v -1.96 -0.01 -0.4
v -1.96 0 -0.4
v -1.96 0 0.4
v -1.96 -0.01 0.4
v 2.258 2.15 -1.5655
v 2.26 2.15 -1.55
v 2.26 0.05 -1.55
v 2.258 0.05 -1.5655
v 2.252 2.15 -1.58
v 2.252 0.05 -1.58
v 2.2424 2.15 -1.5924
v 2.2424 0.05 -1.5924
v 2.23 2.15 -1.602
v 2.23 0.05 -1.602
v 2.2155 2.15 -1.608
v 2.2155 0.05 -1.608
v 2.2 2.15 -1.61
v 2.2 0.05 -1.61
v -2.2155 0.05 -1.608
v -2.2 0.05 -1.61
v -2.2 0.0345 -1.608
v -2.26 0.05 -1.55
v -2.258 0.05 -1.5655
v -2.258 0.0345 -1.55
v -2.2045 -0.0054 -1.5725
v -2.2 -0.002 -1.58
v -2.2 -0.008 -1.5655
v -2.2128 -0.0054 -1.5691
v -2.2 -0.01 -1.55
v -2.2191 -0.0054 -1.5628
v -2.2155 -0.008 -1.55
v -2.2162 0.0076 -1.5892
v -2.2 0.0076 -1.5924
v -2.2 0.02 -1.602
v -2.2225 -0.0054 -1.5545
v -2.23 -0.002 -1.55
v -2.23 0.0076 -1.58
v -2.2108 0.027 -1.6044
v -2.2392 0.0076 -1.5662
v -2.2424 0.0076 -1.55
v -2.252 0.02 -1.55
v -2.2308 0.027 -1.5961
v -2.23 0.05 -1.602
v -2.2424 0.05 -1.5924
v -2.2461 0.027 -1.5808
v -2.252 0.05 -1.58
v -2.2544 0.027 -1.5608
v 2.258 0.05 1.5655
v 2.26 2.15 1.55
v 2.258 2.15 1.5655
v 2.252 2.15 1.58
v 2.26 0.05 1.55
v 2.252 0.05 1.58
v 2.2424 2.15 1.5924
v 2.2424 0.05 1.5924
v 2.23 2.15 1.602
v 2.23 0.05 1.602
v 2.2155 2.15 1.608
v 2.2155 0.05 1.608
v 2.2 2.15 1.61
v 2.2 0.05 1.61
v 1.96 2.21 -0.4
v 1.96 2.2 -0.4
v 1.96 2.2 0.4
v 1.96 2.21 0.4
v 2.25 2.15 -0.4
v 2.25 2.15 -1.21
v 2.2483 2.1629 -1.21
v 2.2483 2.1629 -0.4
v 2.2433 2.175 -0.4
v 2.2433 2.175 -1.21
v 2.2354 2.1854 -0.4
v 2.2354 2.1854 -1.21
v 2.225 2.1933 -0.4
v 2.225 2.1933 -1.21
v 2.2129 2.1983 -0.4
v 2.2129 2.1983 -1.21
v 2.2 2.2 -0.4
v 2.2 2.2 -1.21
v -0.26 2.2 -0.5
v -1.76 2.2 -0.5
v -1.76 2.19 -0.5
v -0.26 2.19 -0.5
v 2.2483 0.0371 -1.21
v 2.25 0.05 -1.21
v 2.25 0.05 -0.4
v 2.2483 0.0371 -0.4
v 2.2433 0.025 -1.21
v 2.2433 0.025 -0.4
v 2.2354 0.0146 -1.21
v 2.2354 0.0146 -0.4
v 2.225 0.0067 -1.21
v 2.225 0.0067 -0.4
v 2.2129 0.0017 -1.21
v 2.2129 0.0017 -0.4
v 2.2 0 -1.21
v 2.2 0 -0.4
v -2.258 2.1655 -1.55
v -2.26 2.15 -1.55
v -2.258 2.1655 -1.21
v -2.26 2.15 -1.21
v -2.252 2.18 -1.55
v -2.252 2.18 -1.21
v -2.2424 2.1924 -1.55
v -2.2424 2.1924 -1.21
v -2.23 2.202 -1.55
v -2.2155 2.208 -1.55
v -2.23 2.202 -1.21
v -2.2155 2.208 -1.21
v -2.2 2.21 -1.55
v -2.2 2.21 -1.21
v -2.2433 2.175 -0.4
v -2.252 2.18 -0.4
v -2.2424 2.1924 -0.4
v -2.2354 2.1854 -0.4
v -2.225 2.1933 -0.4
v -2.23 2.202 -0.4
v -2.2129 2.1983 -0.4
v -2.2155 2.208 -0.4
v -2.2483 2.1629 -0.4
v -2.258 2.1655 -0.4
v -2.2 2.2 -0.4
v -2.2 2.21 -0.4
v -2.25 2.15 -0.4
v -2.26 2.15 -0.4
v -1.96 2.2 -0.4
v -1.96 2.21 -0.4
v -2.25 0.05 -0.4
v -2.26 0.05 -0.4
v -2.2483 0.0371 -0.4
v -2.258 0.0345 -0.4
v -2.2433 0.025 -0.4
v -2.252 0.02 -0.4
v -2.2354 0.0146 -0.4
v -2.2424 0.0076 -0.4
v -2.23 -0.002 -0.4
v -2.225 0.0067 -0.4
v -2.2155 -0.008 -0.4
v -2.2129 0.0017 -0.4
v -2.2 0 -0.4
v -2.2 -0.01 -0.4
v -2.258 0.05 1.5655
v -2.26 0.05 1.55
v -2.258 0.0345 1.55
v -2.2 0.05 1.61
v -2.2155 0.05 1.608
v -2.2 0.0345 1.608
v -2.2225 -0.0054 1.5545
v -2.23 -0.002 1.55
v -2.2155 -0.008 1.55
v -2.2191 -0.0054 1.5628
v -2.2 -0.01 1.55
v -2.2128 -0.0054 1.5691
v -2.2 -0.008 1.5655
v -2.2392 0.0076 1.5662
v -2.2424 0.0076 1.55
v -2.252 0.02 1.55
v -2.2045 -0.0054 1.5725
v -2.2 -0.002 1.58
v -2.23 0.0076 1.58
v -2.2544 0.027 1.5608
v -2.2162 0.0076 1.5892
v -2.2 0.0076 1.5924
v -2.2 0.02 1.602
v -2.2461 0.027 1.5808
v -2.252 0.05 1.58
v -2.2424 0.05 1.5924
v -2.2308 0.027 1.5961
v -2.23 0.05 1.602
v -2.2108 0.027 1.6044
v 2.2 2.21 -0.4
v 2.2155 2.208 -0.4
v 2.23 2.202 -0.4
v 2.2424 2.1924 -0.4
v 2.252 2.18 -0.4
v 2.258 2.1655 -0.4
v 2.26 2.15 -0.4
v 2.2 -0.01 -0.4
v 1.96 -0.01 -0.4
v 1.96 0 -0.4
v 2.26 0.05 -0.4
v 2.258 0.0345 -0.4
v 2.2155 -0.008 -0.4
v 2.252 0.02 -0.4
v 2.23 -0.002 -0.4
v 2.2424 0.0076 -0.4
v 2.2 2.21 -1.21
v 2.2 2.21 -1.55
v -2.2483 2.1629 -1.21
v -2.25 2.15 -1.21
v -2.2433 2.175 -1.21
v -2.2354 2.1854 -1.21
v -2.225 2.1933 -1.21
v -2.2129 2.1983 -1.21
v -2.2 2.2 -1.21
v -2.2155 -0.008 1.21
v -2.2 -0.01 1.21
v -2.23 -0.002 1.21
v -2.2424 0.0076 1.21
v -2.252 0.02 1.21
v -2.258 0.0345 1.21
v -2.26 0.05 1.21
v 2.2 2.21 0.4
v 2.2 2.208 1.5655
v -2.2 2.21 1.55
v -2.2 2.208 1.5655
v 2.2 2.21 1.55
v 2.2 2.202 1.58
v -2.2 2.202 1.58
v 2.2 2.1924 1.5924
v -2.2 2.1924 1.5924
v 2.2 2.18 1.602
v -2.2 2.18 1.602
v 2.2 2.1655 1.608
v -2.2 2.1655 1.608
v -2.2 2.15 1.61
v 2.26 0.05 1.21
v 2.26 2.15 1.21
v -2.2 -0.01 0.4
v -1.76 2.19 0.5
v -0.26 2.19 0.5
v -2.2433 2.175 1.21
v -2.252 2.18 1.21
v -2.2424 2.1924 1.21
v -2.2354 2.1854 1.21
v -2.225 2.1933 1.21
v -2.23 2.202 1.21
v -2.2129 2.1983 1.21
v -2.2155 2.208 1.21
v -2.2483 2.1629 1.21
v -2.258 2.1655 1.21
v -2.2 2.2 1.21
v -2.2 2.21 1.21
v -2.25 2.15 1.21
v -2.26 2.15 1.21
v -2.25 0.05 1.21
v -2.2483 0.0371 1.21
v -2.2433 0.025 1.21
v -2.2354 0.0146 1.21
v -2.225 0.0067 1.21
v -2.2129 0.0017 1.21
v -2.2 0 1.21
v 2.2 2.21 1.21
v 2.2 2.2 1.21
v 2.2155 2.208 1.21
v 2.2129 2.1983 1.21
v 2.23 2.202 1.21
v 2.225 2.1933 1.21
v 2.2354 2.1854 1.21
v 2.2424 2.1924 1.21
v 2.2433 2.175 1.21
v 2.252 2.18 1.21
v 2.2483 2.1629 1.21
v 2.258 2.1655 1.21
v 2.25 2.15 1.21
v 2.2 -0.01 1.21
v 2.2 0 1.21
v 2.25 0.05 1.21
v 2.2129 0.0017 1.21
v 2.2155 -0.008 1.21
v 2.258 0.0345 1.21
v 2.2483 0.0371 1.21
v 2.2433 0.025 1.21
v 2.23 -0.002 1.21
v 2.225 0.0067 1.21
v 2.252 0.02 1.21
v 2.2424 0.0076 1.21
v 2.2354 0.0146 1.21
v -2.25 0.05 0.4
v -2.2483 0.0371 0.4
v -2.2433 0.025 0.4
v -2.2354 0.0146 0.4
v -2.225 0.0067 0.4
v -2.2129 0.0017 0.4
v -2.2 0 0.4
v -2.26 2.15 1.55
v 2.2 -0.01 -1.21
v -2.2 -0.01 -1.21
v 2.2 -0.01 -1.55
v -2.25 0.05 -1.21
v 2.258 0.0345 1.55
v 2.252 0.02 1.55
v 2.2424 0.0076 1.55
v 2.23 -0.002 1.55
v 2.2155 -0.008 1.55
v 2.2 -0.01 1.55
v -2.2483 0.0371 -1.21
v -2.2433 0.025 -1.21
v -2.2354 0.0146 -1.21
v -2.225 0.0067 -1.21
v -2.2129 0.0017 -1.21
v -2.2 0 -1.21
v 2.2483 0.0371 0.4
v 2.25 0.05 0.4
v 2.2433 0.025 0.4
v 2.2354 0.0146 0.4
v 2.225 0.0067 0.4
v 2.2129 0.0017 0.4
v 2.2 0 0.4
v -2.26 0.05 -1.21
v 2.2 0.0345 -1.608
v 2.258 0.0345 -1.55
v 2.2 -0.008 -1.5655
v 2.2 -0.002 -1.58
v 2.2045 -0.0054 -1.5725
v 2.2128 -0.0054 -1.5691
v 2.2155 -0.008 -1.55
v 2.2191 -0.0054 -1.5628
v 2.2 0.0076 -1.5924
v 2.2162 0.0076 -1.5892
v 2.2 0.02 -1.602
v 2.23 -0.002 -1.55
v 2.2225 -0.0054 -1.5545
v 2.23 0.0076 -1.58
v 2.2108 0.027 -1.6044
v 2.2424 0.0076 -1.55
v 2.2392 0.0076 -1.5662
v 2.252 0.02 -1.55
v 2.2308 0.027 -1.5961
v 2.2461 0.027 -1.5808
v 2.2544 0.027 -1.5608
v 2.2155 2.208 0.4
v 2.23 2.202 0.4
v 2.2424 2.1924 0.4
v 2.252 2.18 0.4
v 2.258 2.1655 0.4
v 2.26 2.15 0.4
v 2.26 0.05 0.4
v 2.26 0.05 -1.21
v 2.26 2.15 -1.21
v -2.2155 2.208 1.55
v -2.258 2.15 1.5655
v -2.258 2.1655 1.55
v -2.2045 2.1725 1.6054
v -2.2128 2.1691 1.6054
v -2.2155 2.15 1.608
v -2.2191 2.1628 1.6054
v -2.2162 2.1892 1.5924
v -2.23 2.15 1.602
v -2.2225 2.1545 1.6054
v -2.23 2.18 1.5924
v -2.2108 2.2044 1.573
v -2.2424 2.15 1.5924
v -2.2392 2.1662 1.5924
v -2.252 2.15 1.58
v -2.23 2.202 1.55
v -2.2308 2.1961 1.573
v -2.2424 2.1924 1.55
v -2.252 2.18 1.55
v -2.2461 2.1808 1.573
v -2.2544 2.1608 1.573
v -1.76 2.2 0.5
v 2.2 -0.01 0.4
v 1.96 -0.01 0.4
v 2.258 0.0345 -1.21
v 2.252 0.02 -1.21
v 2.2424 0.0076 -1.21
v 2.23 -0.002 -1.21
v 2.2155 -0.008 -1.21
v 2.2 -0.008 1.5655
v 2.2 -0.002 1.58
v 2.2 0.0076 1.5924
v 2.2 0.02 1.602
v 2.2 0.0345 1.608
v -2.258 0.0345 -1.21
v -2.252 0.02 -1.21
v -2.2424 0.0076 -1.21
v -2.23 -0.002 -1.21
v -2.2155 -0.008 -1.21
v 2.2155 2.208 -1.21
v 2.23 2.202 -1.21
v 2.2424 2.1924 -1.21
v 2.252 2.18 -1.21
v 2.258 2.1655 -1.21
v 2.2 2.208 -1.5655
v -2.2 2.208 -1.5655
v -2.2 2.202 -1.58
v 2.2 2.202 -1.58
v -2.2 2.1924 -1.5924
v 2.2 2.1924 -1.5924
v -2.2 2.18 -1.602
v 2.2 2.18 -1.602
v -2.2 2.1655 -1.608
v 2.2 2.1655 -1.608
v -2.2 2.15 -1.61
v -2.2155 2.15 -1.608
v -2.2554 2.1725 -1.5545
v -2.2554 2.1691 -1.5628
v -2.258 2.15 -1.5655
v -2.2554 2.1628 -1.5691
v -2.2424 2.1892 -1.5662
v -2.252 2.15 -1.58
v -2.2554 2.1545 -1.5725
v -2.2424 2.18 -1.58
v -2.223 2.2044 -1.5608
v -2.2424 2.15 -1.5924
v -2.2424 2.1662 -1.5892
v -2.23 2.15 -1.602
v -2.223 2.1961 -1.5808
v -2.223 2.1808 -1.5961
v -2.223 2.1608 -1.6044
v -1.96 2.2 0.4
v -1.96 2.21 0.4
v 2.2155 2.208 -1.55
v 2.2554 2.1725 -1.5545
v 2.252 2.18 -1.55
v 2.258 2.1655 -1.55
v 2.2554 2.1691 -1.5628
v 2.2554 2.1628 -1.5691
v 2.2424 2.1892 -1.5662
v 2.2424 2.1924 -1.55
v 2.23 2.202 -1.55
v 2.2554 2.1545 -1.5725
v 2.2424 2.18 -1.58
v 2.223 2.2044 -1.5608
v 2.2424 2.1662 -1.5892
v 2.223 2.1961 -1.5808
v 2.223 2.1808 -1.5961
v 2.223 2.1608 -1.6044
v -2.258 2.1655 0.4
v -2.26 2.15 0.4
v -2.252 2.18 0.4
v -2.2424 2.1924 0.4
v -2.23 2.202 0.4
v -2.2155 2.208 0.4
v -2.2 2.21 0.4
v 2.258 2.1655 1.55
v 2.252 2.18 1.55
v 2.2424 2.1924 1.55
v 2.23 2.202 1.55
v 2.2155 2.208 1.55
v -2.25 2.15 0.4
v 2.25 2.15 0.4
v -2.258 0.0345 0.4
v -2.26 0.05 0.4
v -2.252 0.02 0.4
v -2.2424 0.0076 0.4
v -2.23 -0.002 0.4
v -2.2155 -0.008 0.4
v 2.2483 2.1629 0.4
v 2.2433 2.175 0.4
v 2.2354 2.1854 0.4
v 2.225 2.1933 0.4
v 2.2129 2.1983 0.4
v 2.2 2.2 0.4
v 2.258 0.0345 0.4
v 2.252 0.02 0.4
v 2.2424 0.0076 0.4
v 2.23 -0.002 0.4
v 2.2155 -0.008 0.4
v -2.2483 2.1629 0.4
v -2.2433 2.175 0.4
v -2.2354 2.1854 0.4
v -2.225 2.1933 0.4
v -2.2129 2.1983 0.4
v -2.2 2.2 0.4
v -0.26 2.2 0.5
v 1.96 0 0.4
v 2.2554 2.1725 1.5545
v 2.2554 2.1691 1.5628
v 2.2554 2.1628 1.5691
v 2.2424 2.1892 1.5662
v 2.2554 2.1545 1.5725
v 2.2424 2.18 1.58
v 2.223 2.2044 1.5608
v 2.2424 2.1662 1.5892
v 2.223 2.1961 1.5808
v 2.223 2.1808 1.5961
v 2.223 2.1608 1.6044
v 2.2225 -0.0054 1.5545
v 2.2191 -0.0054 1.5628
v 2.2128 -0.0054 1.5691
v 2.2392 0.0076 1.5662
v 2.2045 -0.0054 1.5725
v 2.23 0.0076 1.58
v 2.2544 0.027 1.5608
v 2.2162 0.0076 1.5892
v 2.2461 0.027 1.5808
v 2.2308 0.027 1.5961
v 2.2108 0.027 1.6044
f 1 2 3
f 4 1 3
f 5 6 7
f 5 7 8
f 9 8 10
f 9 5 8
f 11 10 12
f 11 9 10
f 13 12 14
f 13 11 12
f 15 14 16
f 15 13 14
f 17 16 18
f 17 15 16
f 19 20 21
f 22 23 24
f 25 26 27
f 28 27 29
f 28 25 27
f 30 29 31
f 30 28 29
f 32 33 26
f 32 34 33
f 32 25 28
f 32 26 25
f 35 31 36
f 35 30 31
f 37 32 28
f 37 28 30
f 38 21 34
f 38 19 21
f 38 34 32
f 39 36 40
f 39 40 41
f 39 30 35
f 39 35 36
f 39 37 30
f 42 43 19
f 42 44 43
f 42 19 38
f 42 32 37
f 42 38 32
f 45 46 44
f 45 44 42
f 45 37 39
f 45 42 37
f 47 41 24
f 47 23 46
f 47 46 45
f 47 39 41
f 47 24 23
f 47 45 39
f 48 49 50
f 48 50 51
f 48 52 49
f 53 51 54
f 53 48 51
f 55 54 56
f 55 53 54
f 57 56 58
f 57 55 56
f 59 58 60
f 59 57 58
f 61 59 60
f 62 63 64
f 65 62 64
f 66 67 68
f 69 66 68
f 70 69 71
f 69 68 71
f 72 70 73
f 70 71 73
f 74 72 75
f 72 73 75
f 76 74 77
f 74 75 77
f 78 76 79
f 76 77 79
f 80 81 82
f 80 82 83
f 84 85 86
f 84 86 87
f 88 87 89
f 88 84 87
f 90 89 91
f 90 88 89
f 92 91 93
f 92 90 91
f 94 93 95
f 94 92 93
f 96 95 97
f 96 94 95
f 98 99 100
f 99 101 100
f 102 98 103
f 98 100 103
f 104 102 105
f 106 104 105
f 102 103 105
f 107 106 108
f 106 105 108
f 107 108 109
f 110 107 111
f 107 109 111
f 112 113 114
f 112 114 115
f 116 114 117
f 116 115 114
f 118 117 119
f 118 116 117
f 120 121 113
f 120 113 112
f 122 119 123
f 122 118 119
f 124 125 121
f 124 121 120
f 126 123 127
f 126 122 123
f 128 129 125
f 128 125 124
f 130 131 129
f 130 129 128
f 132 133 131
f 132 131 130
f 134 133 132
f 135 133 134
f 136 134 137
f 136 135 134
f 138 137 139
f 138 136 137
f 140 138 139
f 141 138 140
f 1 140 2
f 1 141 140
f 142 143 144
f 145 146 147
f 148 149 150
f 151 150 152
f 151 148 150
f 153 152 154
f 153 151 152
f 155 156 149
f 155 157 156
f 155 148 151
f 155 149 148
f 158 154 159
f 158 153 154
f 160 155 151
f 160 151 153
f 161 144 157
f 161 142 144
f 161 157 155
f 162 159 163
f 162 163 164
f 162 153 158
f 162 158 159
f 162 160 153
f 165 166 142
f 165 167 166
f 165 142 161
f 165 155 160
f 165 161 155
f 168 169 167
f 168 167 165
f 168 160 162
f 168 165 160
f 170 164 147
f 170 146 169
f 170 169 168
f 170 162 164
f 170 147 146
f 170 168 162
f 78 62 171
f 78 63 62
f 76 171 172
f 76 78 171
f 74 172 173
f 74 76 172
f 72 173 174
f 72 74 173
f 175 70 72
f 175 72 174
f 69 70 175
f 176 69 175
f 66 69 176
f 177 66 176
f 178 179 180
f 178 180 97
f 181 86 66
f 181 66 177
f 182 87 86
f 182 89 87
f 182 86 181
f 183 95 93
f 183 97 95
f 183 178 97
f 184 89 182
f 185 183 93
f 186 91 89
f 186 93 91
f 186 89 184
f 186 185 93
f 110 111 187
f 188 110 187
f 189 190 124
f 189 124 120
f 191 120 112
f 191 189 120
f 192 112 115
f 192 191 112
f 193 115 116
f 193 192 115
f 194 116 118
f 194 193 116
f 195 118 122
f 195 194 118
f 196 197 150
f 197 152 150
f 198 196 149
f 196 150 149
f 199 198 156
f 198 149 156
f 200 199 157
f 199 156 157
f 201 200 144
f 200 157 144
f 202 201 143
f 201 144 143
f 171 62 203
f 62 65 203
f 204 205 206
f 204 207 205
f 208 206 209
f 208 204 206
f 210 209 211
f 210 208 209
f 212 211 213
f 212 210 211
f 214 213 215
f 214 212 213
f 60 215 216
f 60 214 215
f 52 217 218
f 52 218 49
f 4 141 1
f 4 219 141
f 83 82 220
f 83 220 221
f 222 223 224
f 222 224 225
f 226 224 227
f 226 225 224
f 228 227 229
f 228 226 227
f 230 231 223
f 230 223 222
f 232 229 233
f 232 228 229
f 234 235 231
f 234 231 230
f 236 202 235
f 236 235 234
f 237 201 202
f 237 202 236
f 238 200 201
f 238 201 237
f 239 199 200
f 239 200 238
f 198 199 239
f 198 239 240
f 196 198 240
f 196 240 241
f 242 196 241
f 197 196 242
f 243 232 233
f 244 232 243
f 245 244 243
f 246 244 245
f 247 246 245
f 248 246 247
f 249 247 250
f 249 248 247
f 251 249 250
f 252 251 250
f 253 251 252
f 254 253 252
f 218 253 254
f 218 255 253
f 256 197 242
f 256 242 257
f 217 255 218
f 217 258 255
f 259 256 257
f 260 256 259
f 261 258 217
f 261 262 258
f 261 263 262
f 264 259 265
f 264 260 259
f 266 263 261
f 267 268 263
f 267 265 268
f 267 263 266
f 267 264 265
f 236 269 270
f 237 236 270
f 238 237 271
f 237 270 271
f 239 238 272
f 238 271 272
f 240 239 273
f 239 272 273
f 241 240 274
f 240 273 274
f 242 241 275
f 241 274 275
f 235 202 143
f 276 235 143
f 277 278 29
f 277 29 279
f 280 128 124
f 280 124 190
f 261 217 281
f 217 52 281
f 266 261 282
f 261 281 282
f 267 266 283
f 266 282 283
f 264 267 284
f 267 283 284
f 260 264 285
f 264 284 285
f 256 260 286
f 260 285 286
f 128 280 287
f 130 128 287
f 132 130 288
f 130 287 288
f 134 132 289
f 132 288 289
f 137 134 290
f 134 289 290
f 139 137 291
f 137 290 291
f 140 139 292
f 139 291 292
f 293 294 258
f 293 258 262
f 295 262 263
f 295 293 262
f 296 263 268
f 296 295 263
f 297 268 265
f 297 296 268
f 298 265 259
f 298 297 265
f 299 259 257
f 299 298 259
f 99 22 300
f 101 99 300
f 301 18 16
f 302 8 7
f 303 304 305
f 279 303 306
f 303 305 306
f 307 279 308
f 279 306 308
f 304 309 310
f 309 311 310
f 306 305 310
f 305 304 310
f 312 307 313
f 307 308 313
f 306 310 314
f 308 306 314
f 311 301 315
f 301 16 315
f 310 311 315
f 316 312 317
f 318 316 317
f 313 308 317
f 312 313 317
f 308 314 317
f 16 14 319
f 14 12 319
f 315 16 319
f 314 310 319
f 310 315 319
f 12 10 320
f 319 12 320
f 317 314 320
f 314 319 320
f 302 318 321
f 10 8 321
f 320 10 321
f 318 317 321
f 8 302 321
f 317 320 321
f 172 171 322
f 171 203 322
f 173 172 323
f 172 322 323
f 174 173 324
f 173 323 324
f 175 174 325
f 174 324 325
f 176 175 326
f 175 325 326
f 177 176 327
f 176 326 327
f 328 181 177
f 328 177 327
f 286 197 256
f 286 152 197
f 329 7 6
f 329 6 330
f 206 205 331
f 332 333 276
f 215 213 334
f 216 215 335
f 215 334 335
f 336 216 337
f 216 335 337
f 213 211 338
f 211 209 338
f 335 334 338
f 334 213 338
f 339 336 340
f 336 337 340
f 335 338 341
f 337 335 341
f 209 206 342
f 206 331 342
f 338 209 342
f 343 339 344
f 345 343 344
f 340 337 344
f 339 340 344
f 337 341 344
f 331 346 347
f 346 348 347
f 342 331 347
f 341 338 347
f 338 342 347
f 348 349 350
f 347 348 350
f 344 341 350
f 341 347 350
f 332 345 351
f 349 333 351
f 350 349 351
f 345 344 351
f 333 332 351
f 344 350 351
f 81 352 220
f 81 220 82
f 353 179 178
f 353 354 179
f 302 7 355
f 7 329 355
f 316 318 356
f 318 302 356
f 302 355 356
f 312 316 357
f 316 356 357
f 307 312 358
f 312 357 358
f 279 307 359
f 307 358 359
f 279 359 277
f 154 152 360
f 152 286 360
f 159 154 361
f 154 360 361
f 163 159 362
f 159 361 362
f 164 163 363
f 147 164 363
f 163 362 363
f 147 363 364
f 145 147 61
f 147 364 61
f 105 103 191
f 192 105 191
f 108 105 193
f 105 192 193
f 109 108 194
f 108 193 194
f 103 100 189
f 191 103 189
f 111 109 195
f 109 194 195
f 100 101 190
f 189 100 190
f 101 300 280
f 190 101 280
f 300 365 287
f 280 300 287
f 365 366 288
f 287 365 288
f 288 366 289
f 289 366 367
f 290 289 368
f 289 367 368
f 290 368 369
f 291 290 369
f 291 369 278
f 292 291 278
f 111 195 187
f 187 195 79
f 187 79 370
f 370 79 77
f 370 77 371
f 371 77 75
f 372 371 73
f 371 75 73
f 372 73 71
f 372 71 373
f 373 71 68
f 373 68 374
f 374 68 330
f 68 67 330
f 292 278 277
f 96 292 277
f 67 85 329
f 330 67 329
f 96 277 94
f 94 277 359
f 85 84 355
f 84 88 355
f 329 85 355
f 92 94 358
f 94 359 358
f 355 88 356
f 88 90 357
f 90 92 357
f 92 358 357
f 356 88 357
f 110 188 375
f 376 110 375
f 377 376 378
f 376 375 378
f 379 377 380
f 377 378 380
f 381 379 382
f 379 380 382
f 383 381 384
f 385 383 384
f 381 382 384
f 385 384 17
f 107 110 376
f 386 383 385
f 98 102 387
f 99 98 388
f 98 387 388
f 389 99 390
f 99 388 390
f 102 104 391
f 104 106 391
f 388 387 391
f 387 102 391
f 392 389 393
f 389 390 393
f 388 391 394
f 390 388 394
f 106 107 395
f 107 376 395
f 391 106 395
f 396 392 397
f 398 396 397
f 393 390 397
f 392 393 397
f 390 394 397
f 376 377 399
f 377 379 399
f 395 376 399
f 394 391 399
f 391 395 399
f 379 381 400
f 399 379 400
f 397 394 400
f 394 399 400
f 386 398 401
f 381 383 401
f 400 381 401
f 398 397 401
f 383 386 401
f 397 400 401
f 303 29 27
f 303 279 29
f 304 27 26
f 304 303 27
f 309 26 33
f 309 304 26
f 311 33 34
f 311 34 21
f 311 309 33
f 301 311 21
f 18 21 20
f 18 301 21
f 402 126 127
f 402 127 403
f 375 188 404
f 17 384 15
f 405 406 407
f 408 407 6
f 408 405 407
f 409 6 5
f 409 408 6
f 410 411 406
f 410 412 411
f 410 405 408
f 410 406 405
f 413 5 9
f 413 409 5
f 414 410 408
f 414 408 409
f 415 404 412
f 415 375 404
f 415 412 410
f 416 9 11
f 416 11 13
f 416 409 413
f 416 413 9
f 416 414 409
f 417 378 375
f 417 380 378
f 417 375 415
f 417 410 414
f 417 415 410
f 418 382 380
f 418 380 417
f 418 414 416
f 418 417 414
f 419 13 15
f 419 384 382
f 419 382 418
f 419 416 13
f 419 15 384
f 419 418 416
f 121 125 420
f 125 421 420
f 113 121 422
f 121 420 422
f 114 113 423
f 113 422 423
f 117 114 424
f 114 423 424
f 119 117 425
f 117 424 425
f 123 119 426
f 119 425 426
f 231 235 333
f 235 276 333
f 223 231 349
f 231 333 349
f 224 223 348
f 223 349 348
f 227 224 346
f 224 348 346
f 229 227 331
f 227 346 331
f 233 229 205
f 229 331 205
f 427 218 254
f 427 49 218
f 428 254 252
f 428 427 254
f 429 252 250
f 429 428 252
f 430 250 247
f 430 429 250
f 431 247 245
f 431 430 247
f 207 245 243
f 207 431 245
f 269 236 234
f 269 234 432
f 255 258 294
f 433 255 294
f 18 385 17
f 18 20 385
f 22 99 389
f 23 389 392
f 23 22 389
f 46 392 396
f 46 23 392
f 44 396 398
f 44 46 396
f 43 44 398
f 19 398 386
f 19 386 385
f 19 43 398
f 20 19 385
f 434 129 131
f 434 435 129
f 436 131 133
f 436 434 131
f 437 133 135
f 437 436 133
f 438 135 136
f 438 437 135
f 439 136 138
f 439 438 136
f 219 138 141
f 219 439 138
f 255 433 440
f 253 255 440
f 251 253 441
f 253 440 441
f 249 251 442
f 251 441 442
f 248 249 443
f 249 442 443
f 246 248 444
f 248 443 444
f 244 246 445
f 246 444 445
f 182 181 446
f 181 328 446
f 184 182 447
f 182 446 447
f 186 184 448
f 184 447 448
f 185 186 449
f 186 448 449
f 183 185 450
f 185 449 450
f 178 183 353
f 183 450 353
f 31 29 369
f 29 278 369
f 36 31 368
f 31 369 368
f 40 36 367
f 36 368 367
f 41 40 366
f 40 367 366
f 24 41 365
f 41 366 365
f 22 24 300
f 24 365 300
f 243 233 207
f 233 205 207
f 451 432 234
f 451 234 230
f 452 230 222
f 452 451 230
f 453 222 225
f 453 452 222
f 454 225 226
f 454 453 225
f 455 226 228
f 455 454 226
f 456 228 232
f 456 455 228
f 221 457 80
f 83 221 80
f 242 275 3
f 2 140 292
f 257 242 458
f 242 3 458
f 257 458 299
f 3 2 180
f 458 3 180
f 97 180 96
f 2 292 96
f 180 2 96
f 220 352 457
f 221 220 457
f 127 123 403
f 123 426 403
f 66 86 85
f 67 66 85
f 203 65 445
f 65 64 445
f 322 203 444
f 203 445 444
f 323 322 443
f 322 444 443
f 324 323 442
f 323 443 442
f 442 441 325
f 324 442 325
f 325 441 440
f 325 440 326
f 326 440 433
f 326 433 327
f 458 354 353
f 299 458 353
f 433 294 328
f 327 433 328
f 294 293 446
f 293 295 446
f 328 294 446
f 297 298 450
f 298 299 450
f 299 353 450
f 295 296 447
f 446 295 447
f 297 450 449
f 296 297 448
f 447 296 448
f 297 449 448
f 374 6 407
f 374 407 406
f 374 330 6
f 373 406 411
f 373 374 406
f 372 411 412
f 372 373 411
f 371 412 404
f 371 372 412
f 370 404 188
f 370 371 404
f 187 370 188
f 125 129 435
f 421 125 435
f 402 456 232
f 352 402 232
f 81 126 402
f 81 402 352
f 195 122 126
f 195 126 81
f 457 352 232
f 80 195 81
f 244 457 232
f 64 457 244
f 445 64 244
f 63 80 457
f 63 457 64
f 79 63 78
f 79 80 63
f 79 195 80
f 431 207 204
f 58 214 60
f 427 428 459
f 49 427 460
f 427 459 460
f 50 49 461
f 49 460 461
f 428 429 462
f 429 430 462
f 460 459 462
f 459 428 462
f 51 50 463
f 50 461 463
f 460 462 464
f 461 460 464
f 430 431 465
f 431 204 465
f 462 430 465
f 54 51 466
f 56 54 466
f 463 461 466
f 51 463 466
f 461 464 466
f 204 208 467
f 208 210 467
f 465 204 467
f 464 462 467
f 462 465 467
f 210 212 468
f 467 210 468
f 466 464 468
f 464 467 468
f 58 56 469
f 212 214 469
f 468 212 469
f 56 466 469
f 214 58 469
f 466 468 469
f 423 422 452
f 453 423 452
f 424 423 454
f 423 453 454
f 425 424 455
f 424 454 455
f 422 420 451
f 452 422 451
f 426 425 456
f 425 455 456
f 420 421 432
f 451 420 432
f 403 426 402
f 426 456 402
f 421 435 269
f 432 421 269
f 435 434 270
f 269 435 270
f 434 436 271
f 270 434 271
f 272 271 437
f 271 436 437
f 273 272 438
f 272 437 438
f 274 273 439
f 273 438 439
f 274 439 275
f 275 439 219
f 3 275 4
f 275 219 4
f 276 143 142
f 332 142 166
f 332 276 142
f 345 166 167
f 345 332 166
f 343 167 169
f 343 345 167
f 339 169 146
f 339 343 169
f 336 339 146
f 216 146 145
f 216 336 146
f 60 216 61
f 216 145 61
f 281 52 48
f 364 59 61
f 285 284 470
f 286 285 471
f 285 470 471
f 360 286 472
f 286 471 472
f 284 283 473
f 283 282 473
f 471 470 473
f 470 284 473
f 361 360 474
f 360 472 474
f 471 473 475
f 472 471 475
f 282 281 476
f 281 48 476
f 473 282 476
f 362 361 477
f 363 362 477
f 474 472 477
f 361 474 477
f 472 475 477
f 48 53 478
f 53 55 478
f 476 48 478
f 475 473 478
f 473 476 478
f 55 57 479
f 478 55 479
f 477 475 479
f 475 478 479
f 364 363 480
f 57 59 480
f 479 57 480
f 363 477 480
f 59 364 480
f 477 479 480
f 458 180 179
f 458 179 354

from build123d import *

# Parameters (mm, degrees)
SKETCH1_W           = 4.5
SKETCH1_H           = 3.2
BOSS_EXTRUDE1_DEPTH = 2.2
FILLET1_R           = 0.05
SKETCH2_W           = 0.3
SKETCH2_H           = 0.8
SKETCH2_W_2         = 4.52
SKETCH2_H_2         = 0.4
BOSS_EXTRUDE2_DEPTH = 0.01
SKETCH4_W           = 0.3
SKETCH4_H           = 0.8
SKETCH4_W_2         = 4.52
SKETCH4_H_2         = 0.4
BOSS_EXTRUDE3_DEPTH = 2.21
SKETCH3_W           = 1.5
SKETCH3_H           = 1
CUT_EXTRUDE1_DEPTH  = 0.01
FILLET2_R           = 0.06


with BuildPart() as part:
    # Sketch1 → Boss-Extrude1 (new body)
    with BuildSketch(Plane(origin=(0, 0, 0), x_dir=(1, 0, 0), z_dir=(0, 1, 0))):
        Rectangle(SKETCH1_W, SKETCH1_H)
    extrude(amount=BOSS_EXTRUDE1_DEPTH)

    # Fillet1
    fillet1_edges = [part.edges().sort_by_distance(p)[0] for p in [
        (-2.25, 2.2, 0),
        (0, 2.2, 1.6),
        (2.25, 2.2, 0),
        (0, 0, 1.6),
        (-2.25, 0, 0),
        (0, 0, -1.6),
        (2.25, 0, 0),
        (2.25, 1.1, 1.6),
        (-2.25, 1.1, 1.6),
        (-2.25, 1.1, -1.6),
        (2.25, 1.1, -1.6),
        (0, 2.2, -1.6),
    ]]
    fillet(fillet1_edges, radius=FILLET1_R)

    # Sketch2 → Boss-Extrude2 (add)
    with BuildSketch(Plane.XZ):
        with Locations((-2.11, 0)):
            Rectangle(SKETCH2_W, SKETCH2_H)
        with Locations((2.11, 0)):
            Rectangle(SKETCH2_W, SKETCH2_H)
        with Locations((0, 1.41)):
            Rectangle(SKETCH2_W_2, SKETCH2_H_2)
        with Locations((0, -1.41)):
            Rectangle(SKETCH2_W_2, SKETCH2_H_2)
    extrude(amount=BOSS_EXTRUDE2_DEPTH)

    # Sketch4 → Boss-Extrude3 (add)
    with BuildSketch(Plane.XZ):
        with Locations((-2.11, 0)):
            Rectangle(SKETCH4_W, SKETCH4_H)
        with Locations((0, 1.41)):
            Rectangle(SKETCH4_W_2, SKETCH4_H_2)
        with Locations((2.11, 0)):
            Rectangle(SKETCH4_W, SKETCH4_H)
        with Locations((0, -1.41)):
            Rectangle(SKETCH4_W_2, SKETCH4_H_2)
    extrude(amount=-BOSS_EXTRUDE3_DEPTH)

    # Sketch3 → Cut-Extrude1 (cut)
    with BuildSketch(Plane(origin=(0, 2.2, 0), x_dir=(1, 0, 0), z_dir=(0, 1, 0))):
        with Locations((-1.01, 0)):
            Rectangle(SKETCH3_W, SKETCH3_H)
    extrude(amount=-CUT_EXTRUDE1_DEPTH, mode=Mode.SUBTRACT)

    # Fillet2
    fillet2_edges = [part.edges().sort_by_distance(p)[0] for p in [
        (-2.26, 2.21, 0),
        (-2.26, 2.21, 1.41),
        (0, 2.21, 1.61),
        (2.26, 2.21, 1.41),
        (2.26, 2.21, 0),
        (0, 2.21, -1.61),
        (-2.26, 2.21, -1.41),
        (2.26, 2.21, -1.41),
        (-2.26, -0.01, 0),
        (2.26, -0.01, 0),
        (-2.26, 1.1, 1.61),
        (2.26, 1.1, 1.61),
        (-2.26, -0.01, 1.41),
        (2.26, -0.01, 1.41),
        (0, -0.01, 1.61),
        (-2.26, 1.1, -1.61),
        (2.26, 1.1, -1.61),
        (0, -0.01, -1.61),
        (2.26, -0.01, -1.41),
        (-2.26, -0.01, -1.41),
    ]]
    fillet(fillet2_edges, radius=FILLET2_R)


solid = part.part
